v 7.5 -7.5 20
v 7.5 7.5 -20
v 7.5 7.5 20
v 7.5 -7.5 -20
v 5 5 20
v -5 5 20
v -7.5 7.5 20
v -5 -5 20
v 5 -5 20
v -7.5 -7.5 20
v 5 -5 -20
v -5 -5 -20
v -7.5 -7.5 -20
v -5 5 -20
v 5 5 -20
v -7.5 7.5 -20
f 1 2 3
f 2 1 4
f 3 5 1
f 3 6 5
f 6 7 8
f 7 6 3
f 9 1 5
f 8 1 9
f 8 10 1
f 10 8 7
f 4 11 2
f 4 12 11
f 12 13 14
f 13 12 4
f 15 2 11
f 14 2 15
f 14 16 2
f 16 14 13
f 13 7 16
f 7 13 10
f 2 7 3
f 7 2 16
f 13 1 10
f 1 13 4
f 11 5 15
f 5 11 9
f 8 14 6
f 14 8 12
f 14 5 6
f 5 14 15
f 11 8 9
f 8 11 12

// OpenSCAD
difference()
{
	cube([15, 15, 40], center = true);
	cube([10, 10, 41], center = true);
}
